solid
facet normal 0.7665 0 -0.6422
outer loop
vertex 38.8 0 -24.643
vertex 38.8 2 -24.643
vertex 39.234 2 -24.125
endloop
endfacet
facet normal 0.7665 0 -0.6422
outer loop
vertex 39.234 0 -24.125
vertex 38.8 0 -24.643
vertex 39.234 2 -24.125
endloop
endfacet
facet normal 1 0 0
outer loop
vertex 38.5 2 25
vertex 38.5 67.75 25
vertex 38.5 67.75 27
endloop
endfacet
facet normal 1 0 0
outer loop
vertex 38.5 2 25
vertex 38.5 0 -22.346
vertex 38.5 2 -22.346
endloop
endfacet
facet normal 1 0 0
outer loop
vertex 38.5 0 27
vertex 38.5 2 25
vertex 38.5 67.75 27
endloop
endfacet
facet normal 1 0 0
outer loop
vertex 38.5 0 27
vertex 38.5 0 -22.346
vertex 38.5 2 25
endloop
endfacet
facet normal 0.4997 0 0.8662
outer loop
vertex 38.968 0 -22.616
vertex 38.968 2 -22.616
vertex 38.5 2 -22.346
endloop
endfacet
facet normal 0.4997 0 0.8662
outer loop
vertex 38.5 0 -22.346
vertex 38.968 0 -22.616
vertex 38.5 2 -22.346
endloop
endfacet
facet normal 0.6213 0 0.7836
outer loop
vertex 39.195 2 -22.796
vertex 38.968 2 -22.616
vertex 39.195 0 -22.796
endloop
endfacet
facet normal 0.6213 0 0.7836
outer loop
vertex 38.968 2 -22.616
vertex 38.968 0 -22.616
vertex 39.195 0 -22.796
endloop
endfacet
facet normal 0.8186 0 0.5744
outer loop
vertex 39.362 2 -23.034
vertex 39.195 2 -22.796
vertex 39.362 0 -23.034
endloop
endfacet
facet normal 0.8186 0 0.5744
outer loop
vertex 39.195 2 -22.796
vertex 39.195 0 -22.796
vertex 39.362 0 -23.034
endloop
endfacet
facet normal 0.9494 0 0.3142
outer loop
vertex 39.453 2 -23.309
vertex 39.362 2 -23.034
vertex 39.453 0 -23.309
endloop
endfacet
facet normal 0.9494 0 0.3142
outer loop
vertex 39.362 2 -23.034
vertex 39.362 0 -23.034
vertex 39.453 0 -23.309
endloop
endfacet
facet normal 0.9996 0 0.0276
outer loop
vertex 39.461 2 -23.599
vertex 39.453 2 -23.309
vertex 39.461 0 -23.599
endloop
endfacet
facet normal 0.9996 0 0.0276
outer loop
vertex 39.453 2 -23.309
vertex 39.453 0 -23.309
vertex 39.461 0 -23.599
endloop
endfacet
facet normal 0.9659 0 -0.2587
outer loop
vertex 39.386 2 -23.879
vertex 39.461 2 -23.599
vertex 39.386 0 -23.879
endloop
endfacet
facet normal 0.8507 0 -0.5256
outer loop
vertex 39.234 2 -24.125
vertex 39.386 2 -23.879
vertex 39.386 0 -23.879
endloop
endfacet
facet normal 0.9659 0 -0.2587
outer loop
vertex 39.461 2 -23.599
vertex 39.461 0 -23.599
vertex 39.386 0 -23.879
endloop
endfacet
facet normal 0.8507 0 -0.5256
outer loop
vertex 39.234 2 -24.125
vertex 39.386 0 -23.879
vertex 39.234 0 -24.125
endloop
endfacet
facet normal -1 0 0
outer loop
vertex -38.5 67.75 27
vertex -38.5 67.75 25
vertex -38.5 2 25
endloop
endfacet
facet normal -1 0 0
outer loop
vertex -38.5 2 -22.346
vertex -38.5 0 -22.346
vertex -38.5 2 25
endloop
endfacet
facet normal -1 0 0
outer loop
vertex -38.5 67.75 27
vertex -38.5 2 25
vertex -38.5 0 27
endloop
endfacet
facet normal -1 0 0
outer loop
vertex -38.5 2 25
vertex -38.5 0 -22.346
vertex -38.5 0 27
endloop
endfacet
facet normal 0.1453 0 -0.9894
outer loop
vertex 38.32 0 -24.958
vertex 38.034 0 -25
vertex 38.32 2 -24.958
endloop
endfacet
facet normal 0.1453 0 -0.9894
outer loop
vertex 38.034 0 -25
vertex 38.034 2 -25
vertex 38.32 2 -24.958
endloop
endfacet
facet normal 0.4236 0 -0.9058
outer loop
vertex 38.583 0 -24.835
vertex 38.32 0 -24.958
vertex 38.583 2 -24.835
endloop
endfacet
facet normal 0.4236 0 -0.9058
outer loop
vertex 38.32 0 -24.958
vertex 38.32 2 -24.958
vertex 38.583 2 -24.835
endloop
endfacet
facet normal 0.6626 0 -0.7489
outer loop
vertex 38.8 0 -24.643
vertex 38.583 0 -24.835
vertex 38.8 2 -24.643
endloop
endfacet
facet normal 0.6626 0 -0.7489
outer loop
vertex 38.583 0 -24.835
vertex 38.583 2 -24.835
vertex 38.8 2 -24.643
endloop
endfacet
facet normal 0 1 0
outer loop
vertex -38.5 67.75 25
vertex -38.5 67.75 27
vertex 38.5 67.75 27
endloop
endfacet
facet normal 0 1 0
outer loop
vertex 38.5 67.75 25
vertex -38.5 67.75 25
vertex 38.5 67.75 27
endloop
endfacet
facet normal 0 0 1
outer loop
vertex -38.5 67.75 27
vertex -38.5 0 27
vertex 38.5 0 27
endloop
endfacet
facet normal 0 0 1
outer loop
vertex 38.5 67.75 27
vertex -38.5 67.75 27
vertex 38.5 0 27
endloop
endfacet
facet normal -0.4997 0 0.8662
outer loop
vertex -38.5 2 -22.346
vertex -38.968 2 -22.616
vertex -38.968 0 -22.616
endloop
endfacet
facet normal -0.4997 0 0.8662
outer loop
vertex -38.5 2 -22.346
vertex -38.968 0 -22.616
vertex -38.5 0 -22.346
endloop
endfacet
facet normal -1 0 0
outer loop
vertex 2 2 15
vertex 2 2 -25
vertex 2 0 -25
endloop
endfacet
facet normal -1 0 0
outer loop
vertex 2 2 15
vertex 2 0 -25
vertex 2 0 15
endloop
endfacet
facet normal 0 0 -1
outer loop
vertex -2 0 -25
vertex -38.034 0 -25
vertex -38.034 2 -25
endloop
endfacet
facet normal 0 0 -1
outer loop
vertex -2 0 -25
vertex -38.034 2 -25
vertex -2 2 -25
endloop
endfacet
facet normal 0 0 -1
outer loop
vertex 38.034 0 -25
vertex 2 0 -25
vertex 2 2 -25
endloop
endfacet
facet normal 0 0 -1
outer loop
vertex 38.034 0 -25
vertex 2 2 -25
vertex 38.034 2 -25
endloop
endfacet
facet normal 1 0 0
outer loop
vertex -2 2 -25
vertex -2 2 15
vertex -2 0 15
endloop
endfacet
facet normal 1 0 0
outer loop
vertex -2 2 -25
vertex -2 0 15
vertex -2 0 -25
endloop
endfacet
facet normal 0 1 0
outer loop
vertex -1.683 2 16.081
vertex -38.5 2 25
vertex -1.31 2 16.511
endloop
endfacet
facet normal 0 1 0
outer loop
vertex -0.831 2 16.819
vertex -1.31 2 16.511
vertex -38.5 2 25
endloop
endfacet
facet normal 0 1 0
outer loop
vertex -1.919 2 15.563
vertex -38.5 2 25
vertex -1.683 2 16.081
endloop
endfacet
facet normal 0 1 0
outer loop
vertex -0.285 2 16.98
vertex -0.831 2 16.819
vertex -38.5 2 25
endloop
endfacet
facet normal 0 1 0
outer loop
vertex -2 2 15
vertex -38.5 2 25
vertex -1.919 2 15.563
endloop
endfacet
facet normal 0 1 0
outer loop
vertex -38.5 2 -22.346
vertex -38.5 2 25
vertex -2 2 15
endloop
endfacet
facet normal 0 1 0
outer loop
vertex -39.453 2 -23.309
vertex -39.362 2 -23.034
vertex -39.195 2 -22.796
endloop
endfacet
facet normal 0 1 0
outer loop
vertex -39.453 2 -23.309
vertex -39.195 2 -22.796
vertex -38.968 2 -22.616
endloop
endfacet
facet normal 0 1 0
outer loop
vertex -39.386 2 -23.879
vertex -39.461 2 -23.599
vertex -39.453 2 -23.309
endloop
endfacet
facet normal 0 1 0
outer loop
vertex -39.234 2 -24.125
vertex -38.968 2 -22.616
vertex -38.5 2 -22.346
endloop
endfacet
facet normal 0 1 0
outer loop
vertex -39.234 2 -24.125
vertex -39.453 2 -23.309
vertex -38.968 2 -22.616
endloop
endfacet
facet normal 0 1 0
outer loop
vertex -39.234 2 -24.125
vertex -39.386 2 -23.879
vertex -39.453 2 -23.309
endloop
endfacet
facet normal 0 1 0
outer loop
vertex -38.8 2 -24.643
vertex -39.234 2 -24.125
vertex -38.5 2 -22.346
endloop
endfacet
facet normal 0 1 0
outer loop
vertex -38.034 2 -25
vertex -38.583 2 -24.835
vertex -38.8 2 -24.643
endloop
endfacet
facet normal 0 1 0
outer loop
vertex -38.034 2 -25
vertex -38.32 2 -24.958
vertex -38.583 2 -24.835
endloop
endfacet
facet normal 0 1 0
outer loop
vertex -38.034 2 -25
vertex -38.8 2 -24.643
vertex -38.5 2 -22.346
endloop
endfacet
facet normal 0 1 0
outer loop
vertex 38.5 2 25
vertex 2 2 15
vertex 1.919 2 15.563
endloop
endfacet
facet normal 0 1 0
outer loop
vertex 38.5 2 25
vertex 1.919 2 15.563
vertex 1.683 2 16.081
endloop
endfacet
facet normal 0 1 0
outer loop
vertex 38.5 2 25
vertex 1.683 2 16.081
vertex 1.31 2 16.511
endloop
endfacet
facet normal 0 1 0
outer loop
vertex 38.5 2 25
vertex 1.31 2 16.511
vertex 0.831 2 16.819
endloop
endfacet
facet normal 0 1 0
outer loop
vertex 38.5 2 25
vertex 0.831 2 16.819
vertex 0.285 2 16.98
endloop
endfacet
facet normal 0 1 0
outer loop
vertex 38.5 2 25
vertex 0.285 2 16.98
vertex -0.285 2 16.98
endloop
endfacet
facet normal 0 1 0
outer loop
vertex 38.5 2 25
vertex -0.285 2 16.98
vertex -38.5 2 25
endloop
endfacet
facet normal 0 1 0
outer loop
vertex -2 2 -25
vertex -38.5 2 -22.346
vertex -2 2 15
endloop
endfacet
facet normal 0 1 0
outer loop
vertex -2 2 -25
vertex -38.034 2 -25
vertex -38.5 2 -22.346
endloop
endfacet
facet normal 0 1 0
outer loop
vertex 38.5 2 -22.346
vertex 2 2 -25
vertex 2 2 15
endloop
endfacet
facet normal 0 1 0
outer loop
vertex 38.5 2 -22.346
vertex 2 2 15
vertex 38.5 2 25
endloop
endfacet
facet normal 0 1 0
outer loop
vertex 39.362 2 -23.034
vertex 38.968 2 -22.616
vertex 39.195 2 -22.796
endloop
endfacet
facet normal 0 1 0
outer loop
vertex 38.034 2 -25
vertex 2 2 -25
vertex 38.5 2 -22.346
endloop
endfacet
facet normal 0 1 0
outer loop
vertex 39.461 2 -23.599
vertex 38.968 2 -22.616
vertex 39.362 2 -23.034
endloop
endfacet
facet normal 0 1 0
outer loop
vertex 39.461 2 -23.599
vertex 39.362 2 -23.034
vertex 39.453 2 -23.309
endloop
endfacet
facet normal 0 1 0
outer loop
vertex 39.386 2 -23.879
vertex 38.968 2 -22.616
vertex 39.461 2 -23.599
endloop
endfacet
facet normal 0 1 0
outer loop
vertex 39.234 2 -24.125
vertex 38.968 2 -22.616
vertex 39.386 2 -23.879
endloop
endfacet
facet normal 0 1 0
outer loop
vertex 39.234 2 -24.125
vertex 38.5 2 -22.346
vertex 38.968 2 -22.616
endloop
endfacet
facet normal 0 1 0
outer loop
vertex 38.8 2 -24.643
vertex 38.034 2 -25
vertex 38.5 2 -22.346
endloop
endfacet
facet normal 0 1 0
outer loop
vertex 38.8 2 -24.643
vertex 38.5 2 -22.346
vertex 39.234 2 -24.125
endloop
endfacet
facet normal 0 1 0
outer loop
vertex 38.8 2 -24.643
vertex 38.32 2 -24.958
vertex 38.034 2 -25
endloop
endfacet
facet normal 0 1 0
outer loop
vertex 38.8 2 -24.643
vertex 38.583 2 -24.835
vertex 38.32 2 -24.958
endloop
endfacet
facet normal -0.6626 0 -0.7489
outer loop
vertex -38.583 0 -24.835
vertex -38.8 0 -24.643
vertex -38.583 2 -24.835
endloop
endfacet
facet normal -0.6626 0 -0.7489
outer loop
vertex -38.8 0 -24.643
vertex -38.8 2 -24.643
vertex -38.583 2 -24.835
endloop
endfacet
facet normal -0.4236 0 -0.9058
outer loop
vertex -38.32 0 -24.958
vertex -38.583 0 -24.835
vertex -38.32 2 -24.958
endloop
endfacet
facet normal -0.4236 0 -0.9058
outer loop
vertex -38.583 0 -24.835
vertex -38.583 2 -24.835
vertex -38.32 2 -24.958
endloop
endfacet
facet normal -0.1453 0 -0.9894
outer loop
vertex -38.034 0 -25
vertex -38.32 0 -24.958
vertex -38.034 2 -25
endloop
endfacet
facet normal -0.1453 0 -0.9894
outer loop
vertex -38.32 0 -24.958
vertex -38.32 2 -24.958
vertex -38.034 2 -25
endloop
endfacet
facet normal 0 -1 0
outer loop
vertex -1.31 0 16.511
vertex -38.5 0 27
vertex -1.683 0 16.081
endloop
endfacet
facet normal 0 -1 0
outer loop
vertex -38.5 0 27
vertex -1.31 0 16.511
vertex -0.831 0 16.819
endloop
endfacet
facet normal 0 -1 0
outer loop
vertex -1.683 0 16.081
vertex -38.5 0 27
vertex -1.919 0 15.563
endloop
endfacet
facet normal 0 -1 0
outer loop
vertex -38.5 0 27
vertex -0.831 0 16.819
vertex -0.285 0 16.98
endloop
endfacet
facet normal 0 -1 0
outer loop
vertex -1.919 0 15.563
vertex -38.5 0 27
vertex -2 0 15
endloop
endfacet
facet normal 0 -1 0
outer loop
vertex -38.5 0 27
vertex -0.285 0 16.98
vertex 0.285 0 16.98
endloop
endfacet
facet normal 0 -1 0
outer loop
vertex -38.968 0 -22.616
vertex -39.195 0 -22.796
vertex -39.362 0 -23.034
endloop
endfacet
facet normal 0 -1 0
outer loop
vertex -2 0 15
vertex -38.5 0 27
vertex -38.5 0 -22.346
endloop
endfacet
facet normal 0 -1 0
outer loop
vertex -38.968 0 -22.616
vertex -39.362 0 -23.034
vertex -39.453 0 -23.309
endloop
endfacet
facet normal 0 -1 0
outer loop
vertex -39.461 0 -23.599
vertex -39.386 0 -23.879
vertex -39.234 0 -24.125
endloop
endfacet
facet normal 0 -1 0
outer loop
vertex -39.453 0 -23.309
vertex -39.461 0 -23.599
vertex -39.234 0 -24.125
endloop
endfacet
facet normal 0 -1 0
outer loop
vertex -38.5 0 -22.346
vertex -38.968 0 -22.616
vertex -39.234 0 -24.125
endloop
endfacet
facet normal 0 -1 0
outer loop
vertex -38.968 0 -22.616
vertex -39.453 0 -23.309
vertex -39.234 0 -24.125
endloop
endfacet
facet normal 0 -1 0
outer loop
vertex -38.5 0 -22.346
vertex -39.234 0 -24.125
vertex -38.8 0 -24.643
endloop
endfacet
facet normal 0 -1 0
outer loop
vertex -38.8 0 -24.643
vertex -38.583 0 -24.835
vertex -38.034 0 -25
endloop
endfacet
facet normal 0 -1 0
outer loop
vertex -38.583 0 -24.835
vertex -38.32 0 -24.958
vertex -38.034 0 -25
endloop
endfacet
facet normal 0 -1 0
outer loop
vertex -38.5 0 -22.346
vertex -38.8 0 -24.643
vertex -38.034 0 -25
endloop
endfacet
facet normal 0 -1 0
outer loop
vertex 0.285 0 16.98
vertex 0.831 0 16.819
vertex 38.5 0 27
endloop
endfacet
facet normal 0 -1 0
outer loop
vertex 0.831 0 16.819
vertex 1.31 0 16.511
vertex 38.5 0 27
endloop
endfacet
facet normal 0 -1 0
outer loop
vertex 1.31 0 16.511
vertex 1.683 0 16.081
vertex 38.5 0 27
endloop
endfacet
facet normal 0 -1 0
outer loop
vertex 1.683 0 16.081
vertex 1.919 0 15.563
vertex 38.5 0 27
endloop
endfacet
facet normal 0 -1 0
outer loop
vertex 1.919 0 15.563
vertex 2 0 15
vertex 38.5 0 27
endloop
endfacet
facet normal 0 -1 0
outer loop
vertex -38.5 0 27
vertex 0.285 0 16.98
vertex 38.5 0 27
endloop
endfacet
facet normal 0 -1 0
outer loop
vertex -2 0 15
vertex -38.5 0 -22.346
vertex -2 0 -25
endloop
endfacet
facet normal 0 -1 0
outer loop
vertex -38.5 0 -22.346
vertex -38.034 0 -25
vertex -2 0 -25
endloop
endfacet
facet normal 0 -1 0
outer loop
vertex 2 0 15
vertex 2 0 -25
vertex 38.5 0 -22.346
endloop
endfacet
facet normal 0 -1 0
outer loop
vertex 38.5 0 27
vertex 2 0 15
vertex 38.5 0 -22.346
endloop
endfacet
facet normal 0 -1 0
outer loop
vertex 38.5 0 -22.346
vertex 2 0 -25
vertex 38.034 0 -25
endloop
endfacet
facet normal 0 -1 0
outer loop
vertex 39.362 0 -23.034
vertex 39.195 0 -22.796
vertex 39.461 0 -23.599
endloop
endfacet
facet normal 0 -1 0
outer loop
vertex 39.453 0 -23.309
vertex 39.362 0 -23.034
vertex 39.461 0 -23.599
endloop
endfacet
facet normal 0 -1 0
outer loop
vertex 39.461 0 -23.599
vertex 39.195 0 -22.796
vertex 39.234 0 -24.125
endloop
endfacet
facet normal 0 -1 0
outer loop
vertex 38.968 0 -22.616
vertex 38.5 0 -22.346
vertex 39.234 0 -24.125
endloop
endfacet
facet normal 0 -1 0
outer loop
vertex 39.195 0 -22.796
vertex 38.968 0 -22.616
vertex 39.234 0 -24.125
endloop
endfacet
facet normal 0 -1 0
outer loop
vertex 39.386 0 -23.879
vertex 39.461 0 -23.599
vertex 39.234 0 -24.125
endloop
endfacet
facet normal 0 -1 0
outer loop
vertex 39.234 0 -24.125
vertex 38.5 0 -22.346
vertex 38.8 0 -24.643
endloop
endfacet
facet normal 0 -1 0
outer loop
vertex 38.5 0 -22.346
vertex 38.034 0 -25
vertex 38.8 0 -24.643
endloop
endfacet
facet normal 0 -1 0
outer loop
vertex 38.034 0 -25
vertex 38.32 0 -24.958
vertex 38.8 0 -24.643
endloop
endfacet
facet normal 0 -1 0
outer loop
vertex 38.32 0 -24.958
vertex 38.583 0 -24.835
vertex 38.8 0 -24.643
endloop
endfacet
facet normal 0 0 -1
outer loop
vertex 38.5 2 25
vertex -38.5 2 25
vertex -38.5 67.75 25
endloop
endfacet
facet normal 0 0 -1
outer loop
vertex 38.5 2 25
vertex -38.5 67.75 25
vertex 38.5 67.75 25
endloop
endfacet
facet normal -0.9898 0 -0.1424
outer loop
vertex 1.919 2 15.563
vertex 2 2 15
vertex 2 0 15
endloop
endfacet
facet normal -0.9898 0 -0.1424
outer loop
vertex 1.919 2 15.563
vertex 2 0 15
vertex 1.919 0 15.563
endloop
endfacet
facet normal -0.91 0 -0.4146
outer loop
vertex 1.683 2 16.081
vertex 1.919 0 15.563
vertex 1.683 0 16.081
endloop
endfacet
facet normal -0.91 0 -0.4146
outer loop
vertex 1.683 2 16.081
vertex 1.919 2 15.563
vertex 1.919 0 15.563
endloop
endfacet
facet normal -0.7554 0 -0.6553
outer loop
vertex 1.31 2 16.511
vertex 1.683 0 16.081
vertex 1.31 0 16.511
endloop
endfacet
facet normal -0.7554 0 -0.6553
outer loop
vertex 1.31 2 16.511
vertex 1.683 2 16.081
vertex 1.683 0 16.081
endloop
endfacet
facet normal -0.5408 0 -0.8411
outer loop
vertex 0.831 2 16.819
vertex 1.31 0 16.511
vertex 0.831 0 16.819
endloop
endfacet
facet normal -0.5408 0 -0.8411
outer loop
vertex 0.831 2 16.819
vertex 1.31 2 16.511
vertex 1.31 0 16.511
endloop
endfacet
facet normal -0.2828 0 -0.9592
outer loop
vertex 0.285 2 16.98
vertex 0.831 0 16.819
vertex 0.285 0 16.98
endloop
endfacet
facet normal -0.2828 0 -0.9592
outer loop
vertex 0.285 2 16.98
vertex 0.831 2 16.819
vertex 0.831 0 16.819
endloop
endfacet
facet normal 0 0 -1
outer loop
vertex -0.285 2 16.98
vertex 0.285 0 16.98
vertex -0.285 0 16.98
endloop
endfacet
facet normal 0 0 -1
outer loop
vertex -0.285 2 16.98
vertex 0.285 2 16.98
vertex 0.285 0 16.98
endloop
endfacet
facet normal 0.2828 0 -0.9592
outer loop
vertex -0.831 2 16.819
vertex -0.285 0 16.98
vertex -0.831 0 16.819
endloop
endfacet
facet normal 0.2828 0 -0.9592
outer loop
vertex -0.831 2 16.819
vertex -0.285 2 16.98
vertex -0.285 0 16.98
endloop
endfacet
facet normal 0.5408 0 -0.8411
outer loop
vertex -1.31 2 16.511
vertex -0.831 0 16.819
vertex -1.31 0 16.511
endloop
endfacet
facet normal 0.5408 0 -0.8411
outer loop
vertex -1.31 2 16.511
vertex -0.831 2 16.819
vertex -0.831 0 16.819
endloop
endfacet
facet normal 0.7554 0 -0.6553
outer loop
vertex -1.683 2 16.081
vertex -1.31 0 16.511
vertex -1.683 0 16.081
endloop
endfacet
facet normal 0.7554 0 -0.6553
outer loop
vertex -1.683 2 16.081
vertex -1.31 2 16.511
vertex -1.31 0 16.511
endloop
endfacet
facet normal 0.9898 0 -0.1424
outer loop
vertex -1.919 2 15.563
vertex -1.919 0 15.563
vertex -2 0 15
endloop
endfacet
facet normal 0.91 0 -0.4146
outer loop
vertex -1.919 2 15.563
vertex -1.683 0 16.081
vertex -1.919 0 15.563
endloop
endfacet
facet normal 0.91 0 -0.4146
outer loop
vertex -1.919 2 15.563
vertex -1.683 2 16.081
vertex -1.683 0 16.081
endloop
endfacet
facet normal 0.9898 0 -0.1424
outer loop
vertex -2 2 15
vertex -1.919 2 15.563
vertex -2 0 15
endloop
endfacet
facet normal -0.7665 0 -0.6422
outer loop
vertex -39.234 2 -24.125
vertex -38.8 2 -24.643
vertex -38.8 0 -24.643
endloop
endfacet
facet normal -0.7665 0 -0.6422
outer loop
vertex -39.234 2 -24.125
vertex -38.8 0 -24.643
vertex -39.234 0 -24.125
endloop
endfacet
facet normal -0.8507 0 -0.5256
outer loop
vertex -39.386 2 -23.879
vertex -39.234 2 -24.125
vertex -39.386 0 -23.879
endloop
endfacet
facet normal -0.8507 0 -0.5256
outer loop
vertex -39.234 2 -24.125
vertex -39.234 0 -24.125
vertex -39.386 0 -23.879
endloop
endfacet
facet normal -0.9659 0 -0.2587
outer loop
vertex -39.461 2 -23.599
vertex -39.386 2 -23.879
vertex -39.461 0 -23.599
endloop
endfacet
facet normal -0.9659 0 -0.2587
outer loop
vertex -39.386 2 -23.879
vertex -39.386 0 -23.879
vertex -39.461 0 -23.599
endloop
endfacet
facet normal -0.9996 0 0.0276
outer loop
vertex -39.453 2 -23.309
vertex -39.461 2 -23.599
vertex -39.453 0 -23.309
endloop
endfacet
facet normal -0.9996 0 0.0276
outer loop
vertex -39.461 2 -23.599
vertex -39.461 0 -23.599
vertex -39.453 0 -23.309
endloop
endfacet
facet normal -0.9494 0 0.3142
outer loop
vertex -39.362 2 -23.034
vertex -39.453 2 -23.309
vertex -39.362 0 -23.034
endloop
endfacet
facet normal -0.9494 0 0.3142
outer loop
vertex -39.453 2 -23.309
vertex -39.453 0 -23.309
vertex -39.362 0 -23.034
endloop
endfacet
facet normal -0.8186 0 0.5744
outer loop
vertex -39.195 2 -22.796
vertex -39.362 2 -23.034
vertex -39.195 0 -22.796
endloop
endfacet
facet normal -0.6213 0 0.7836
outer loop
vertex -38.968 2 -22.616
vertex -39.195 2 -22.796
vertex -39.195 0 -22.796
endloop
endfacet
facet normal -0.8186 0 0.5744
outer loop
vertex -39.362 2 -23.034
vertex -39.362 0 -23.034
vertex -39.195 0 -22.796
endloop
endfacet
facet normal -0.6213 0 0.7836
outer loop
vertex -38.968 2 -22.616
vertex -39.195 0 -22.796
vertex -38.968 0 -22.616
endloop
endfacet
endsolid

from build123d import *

# Parameters (mm, degrees)
SKETCH1_W           = 77
SKETCH1_H           = 50
BOSS_EXTRUDE1_DEPTH = 2
SKETCH2_W           = 77
SKETCH2_H           = 2
BOSS_EXTRUDE2_DEPTH = 67.75
CUT_EXTRUDE1_DEPTH  = 81.835094483
BOSS_EXTRUDE3_DEPTH = 2
FILLET1_R           = 1


with BuildPart() as part:
    # Sketch1 → Boss-Extrude1 (new body)
    with BuildSketch(Plane(origin=(0, 0, 0), x_dir=(1, 0, 0), z_dir=(0, 1, 0))):
        Rectangle(SKETCH1_W, SKETCH1_H)
    extrude(amount=BOSS_EXTRUDE1_DEPTH)

    # Sketch2 → Boss-Extrude2 (add)
    with BuildSketch(Plane.XZ):
        with Locations((0, 26)):
            Rectangle(SKETCH2_W, SKETCH2_H)
    extrude(amount=-BOSS_EXTRUDE2_DEPTH)

    # Sketch3 → Cut-Extrude1 (cut, through all)
    with BuildSketch(Plane(origin=(0, 2, 0), x_dir=(1, 0, 0), z_dir=(0, 1, 0))):
        with BuildLine():
            Line((2, 25), (2, -15))
            ThreePointArc((2, -15), (0, -17), (-2, -15))
            Line((-2, -15), (-2, 25))
            Line((-2, 25), (2, 25))
        make_face()
    extrude(amount=-CUT_EXTRUDE1_DEPTH, mode=Mode.SUBTRACT)

    # Sketch4 → Boss-Extrude3 (add)
    with BuildSketch(Plane(origin=(0, 2, 0), x_dir=(1, 0, 0), z_dir=(0, 1, 0))):
        Polygon((-38.5, 25), (-40, 23.212369611), (-38.5, 22.346344207), align=None)
        Polygon((40, 23.212369611), (38.5, 22.346344207), (38.5, 25), align=None)
    extrude(amount=-BOSS_EXTRUDE3_DEPTH)

    # Fillet1
    fillet1_edges = [part.edges().sort_by_distance(p)[0] for p in [
        (-40, 1, -23.212369611),
        (40, 1, -23.212369611),
        (-38.5, 1, -25),
        (38.5, 1, -25),
    ]]
    fillet(fillet1_edges, radius=FILLET1_R)


solid = part.part
